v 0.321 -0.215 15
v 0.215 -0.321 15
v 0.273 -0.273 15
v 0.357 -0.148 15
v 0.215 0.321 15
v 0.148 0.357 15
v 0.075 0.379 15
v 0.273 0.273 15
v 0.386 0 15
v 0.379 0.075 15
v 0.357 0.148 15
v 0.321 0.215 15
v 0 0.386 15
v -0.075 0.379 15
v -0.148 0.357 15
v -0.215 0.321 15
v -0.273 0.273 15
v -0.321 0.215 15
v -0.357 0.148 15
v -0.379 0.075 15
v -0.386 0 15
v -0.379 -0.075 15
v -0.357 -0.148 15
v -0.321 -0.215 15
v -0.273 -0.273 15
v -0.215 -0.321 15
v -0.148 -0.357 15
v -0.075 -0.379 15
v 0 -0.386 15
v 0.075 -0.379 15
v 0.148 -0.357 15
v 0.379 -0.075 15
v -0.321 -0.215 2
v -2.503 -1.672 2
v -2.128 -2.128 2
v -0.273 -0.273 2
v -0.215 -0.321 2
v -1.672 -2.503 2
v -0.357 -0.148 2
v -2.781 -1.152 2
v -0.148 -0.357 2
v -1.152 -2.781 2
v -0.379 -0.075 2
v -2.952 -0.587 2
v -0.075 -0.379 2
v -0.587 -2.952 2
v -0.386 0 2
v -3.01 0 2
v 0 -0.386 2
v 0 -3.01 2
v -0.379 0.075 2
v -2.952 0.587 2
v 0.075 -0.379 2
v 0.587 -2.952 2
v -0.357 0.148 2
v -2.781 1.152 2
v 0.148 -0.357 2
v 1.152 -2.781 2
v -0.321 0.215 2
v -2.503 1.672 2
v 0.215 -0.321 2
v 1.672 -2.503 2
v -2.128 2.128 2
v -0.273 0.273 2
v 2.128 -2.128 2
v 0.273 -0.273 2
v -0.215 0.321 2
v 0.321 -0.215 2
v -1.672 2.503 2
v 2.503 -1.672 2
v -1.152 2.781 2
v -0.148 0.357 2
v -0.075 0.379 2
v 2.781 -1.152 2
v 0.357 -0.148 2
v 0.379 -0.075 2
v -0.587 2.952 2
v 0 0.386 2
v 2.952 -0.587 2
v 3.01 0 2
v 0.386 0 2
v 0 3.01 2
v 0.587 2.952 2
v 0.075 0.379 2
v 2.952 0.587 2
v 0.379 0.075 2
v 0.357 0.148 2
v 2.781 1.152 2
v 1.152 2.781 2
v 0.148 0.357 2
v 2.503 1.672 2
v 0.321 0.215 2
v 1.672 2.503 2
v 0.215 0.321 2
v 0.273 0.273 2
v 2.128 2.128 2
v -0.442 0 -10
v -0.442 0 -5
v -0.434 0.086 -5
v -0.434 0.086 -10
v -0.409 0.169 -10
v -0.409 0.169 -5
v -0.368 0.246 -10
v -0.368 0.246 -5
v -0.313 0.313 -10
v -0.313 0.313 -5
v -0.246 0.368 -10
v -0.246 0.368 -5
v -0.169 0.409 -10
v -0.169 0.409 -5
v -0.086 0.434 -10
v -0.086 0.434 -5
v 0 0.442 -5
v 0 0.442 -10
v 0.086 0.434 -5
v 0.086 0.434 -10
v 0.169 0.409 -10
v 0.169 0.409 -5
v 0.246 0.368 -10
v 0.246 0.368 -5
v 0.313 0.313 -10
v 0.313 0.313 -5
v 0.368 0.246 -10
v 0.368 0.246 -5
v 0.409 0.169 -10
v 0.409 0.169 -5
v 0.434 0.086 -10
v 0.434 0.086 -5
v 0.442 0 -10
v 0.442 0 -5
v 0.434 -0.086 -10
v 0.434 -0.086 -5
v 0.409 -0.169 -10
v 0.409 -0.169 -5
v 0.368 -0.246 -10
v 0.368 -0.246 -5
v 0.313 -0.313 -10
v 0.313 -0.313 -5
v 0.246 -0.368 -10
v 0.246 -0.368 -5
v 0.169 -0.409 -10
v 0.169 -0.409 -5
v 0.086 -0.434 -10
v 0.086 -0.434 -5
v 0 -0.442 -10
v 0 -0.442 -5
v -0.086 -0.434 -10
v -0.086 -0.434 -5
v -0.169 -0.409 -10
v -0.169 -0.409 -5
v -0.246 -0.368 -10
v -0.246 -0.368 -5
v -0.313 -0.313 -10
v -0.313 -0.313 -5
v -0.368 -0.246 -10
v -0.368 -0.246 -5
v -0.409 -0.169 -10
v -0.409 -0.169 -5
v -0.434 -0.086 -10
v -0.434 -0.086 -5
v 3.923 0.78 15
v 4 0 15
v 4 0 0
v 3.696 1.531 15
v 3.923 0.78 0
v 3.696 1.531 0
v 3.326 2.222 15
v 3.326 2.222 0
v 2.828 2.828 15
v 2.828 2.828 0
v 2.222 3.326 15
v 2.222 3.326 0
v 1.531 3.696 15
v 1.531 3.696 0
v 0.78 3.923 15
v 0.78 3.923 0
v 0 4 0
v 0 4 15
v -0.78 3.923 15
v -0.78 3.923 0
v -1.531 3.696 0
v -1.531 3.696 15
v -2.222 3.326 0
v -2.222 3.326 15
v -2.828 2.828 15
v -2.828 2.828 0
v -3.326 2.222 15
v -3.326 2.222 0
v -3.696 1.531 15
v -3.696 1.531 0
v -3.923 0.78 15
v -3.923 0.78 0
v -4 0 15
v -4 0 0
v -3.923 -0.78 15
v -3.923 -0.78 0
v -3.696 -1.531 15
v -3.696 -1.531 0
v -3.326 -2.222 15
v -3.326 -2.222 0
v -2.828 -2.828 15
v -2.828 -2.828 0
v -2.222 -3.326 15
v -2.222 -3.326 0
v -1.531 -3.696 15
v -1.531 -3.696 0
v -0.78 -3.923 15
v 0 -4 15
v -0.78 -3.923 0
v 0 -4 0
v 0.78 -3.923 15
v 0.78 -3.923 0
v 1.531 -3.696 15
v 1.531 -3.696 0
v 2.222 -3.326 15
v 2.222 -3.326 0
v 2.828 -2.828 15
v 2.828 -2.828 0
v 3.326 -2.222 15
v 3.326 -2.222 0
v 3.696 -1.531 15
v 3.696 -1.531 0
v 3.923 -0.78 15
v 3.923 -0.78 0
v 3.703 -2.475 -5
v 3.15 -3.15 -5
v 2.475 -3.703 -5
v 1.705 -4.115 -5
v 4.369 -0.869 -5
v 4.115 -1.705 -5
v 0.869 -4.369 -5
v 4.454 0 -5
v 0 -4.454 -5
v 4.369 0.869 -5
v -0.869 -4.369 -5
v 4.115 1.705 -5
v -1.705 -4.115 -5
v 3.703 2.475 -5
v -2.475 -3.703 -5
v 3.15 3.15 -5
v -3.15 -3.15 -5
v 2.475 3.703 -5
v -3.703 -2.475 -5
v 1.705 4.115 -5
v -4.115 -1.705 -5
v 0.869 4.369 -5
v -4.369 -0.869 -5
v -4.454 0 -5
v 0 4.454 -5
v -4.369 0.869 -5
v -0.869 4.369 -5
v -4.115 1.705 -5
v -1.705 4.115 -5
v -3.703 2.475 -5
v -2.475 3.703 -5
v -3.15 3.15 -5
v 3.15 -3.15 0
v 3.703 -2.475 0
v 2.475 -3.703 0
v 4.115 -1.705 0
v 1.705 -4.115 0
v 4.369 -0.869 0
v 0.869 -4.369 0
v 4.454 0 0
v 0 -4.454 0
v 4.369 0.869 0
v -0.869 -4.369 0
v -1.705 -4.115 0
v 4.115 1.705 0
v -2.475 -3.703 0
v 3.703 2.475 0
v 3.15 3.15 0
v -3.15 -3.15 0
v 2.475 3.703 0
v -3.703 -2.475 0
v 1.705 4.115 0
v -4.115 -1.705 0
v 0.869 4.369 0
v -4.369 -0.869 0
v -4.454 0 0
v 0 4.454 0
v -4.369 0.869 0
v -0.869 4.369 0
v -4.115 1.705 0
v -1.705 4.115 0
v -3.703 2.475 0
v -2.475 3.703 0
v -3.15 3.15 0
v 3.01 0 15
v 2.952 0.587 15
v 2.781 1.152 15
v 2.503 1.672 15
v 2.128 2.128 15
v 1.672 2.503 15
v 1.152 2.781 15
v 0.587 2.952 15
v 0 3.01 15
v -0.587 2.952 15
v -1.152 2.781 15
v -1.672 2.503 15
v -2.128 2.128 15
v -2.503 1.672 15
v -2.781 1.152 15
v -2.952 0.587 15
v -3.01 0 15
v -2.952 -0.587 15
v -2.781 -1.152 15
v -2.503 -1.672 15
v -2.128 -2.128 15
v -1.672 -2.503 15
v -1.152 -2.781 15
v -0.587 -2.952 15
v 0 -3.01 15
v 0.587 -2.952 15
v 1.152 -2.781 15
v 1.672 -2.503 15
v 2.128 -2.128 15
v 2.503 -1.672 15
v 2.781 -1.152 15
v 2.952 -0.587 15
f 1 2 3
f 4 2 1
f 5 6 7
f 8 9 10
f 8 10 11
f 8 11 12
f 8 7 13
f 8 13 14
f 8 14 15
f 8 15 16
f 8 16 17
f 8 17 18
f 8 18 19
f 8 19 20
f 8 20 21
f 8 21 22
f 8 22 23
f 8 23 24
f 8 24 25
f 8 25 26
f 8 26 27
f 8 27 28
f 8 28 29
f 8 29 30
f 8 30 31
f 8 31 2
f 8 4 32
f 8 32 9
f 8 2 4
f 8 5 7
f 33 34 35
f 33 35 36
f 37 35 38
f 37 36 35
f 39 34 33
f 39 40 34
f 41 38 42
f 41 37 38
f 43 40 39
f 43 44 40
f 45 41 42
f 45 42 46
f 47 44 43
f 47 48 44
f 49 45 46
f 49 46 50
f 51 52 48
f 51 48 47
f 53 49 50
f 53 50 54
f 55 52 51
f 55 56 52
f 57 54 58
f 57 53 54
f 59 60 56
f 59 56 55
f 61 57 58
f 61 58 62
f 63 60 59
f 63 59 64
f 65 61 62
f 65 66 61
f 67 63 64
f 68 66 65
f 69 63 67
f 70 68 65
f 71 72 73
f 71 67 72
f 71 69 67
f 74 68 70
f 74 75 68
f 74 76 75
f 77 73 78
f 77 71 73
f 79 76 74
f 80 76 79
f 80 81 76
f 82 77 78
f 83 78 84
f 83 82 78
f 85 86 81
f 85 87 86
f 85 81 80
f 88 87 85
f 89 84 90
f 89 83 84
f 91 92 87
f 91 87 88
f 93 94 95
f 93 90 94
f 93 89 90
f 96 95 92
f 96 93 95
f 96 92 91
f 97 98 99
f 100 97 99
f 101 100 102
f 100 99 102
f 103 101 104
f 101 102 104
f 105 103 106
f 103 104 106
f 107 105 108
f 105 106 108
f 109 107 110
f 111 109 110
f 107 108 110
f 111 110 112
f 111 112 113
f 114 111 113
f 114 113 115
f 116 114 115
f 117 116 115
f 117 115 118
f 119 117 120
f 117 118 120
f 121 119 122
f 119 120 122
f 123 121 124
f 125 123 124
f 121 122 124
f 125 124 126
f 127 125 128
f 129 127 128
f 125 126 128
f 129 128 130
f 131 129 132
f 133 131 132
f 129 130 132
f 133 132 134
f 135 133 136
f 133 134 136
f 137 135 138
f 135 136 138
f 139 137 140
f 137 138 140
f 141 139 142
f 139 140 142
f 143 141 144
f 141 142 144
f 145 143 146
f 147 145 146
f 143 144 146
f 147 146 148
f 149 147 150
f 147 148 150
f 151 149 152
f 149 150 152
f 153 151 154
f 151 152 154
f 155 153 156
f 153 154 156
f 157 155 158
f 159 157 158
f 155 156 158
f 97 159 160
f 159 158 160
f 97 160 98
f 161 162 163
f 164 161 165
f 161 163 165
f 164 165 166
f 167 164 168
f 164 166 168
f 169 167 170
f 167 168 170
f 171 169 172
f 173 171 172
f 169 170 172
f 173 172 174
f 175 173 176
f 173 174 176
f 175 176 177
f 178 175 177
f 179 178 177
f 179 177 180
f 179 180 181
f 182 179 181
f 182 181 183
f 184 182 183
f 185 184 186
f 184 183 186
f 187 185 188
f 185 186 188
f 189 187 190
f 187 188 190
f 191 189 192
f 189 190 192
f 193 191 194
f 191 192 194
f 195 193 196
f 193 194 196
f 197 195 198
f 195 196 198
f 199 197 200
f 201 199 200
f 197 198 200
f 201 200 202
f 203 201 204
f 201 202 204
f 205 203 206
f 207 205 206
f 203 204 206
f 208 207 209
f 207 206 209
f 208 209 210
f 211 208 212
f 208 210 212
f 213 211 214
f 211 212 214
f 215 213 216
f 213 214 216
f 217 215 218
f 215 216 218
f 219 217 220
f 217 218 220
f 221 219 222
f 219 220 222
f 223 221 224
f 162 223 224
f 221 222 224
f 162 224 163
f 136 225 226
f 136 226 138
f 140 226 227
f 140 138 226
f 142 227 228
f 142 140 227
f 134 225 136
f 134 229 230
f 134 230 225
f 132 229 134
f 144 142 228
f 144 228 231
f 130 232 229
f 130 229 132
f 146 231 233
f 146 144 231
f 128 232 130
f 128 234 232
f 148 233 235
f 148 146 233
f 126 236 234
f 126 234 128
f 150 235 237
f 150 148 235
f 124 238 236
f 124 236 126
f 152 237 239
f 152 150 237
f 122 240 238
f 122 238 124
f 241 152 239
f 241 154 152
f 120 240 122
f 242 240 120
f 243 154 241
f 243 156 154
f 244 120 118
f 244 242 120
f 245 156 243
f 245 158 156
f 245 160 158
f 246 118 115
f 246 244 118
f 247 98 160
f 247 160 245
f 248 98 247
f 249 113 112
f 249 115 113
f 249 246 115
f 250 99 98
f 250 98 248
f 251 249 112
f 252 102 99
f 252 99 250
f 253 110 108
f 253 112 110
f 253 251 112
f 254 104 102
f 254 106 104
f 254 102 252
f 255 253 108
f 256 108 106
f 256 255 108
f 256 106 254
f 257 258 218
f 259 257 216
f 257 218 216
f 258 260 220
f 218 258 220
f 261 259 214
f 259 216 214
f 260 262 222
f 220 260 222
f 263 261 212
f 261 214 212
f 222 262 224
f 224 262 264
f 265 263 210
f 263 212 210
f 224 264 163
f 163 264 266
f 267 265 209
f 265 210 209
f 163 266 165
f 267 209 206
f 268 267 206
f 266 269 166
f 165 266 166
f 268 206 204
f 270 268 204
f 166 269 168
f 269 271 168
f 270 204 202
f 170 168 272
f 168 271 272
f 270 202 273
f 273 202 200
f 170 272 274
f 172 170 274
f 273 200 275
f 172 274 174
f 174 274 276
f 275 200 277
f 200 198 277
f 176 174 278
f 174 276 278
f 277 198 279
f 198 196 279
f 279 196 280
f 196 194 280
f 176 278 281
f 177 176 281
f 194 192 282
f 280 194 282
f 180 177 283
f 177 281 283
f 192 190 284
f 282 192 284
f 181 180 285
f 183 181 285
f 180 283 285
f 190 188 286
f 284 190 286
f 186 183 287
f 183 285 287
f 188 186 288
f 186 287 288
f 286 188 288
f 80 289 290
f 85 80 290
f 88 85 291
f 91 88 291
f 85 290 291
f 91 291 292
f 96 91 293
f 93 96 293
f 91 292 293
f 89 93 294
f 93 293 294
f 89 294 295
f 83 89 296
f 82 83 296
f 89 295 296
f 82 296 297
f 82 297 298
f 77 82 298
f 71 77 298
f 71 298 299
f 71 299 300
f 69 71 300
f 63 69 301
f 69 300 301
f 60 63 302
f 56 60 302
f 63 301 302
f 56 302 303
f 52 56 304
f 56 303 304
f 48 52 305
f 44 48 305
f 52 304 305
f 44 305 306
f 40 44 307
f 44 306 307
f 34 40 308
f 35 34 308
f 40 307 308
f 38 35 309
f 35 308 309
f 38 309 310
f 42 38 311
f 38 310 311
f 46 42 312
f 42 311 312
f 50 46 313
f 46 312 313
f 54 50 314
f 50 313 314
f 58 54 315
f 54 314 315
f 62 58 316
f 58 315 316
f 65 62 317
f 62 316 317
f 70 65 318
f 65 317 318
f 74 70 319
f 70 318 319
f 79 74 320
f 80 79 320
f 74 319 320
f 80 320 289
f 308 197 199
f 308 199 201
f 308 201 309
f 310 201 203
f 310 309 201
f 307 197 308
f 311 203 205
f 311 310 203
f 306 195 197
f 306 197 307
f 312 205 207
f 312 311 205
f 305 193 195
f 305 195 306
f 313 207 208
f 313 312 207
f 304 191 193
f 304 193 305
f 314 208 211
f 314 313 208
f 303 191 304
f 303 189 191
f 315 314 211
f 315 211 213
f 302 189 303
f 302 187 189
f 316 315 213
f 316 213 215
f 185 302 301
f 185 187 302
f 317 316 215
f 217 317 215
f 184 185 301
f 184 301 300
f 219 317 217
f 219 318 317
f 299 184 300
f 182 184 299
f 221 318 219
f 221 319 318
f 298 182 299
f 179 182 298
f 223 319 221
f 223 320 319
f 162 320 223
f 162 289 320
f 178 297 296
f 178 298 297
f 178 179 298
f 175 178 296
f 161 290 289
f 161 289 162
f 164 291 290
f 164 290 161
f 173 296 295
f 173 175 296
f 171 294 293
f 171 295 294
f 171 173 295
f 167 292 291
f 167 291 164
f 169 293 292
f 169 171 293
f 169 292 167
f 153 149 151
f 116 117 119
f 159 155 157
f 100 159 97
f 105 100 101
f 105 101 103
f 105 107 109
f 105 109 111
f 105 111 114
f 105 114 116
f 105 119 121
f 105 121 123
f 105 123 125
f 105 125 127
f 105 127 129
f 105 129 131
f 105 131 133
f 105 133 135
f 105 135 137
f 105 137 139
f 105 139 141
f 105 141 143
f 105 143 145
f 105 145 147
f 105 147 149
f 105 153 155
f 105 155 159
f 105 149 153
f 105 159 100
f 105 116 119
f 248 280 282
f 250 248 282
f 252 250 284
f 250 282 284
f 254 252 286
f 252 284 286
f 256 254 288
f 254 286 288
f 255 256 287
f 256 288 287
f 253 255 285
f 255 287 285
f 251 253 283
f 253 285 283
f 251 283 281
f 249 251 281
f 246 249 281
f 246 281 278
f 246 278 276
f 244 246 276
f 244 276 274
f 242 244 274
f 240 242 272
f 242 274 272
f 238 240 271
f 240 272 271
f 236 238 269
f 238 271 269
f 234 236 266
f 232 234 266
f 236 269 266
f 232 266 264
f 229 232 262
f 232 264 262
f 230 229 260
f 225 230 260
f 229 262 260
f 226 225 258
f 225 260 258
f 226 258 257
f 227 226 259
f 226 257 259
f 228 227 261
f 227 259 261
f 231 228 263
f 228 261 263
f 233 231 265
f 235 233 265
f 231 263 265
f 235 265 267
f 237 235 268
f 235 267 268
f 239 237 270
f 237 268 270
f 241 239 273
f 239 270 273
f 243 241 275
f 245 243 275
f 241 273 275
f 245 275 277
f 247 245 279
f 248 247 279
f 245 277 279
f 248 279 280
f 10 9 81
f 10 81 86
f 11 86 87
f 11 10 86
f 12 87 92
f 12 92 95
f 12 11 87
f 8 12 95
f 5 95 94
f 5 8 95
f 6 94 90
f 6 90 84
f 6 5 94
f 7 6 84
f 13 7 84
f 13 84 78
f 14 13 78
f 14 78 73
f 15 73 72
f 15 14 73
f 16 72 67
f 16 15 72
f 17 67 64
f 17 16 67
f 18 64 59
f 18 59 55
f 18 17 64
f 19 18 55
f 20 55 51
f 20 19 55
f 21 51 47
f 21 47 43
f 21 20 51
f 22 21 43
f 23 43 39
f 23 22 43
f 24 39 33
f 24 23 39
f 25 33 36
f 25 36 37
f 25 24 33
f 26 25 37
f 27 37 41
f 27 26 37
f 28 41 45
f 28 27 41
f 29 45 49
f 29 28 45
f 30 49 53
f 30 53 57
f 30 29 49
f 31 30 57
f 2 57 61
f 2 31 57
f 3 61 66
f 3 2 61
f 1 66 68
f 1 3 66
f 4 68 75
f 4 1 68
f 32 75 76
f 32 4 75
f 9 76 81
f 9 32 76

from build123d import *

# Parameters (mm, degrees)
SKETCH1_R           = 4
SKETCH1_R_2         = 3
BOSS_EXTRUDE1_DEPTH = 15
SKETCH2_R           = 3
BOSS_EXTRUDE3_DEPTH = 15
SKETCH3_R           = 3.009782436
SKETCH3_R_2         = 0.386251133
CUT_EXTRUDE2_DEPTH  = 13
SKETCH4_R           = 4.454105624
BOSS_EXTRUDE4_DEPTH = 5
SKETCH5_R           = 0.442435296
BOSS_EXTRUDE5_DEPTH = 5


with BuildPart() as part:
    # Sketch1 → Boss-Extrude1 (new body)
    with BuildSketch(Plane.XY):
        Circle(SKETCH1_R)
        Circle(SKETCH1_R_2, mode=Mode.SUBTRACT)
    extrude(amount=BOSS_EXTRUDE1_DEPTH)

    # Sketch2 → Boss-Extrude3 (add)
    with BuildSketch(Plane(origin=(0, 0, 0), x_dir=(-1, 0, 0), z_dir=(0, 0, -1))):
        Circle(SKETCH2_R)
    extrude(amount=-BOSS_EXTRUDE3_DEPTH)

    # Sketch3 → Cut-Extrude2 (cut)
    with BuildSketch(Plane.XY.offset(15)):
        Circle(SKETCH3_R)
        Circle(SKETCH3_R_2, mode=Mode.SUBTRACT)
    extrude(amount=-CUT_EXTRUDE2_DEPTH, mode=Mode.SUBTRACT)

    # Sketch4 → Boss-Extrude4 (add)
    with BuildSketch(Plane(origin=(0, 0, 0), x_dir=(-1, 0, 0), z_dir=(0, 0, -1))):
        Circle(SKETCH4_R)
    extrude(amount=BOSS_EXTRUDE4_DEPTH)

    # Sketch5 → Boss-Extrude5 (add)
    with BuildSketch(Plane(origin=(0, 0, -5), x_dir=(-1, 0, 0), z_dir=(0, 0, -1))):
        Circle(SKETCH5_R)
    extrude(amount=BOSS_EXTRUDE5_DEPTH)


solid = part.part
